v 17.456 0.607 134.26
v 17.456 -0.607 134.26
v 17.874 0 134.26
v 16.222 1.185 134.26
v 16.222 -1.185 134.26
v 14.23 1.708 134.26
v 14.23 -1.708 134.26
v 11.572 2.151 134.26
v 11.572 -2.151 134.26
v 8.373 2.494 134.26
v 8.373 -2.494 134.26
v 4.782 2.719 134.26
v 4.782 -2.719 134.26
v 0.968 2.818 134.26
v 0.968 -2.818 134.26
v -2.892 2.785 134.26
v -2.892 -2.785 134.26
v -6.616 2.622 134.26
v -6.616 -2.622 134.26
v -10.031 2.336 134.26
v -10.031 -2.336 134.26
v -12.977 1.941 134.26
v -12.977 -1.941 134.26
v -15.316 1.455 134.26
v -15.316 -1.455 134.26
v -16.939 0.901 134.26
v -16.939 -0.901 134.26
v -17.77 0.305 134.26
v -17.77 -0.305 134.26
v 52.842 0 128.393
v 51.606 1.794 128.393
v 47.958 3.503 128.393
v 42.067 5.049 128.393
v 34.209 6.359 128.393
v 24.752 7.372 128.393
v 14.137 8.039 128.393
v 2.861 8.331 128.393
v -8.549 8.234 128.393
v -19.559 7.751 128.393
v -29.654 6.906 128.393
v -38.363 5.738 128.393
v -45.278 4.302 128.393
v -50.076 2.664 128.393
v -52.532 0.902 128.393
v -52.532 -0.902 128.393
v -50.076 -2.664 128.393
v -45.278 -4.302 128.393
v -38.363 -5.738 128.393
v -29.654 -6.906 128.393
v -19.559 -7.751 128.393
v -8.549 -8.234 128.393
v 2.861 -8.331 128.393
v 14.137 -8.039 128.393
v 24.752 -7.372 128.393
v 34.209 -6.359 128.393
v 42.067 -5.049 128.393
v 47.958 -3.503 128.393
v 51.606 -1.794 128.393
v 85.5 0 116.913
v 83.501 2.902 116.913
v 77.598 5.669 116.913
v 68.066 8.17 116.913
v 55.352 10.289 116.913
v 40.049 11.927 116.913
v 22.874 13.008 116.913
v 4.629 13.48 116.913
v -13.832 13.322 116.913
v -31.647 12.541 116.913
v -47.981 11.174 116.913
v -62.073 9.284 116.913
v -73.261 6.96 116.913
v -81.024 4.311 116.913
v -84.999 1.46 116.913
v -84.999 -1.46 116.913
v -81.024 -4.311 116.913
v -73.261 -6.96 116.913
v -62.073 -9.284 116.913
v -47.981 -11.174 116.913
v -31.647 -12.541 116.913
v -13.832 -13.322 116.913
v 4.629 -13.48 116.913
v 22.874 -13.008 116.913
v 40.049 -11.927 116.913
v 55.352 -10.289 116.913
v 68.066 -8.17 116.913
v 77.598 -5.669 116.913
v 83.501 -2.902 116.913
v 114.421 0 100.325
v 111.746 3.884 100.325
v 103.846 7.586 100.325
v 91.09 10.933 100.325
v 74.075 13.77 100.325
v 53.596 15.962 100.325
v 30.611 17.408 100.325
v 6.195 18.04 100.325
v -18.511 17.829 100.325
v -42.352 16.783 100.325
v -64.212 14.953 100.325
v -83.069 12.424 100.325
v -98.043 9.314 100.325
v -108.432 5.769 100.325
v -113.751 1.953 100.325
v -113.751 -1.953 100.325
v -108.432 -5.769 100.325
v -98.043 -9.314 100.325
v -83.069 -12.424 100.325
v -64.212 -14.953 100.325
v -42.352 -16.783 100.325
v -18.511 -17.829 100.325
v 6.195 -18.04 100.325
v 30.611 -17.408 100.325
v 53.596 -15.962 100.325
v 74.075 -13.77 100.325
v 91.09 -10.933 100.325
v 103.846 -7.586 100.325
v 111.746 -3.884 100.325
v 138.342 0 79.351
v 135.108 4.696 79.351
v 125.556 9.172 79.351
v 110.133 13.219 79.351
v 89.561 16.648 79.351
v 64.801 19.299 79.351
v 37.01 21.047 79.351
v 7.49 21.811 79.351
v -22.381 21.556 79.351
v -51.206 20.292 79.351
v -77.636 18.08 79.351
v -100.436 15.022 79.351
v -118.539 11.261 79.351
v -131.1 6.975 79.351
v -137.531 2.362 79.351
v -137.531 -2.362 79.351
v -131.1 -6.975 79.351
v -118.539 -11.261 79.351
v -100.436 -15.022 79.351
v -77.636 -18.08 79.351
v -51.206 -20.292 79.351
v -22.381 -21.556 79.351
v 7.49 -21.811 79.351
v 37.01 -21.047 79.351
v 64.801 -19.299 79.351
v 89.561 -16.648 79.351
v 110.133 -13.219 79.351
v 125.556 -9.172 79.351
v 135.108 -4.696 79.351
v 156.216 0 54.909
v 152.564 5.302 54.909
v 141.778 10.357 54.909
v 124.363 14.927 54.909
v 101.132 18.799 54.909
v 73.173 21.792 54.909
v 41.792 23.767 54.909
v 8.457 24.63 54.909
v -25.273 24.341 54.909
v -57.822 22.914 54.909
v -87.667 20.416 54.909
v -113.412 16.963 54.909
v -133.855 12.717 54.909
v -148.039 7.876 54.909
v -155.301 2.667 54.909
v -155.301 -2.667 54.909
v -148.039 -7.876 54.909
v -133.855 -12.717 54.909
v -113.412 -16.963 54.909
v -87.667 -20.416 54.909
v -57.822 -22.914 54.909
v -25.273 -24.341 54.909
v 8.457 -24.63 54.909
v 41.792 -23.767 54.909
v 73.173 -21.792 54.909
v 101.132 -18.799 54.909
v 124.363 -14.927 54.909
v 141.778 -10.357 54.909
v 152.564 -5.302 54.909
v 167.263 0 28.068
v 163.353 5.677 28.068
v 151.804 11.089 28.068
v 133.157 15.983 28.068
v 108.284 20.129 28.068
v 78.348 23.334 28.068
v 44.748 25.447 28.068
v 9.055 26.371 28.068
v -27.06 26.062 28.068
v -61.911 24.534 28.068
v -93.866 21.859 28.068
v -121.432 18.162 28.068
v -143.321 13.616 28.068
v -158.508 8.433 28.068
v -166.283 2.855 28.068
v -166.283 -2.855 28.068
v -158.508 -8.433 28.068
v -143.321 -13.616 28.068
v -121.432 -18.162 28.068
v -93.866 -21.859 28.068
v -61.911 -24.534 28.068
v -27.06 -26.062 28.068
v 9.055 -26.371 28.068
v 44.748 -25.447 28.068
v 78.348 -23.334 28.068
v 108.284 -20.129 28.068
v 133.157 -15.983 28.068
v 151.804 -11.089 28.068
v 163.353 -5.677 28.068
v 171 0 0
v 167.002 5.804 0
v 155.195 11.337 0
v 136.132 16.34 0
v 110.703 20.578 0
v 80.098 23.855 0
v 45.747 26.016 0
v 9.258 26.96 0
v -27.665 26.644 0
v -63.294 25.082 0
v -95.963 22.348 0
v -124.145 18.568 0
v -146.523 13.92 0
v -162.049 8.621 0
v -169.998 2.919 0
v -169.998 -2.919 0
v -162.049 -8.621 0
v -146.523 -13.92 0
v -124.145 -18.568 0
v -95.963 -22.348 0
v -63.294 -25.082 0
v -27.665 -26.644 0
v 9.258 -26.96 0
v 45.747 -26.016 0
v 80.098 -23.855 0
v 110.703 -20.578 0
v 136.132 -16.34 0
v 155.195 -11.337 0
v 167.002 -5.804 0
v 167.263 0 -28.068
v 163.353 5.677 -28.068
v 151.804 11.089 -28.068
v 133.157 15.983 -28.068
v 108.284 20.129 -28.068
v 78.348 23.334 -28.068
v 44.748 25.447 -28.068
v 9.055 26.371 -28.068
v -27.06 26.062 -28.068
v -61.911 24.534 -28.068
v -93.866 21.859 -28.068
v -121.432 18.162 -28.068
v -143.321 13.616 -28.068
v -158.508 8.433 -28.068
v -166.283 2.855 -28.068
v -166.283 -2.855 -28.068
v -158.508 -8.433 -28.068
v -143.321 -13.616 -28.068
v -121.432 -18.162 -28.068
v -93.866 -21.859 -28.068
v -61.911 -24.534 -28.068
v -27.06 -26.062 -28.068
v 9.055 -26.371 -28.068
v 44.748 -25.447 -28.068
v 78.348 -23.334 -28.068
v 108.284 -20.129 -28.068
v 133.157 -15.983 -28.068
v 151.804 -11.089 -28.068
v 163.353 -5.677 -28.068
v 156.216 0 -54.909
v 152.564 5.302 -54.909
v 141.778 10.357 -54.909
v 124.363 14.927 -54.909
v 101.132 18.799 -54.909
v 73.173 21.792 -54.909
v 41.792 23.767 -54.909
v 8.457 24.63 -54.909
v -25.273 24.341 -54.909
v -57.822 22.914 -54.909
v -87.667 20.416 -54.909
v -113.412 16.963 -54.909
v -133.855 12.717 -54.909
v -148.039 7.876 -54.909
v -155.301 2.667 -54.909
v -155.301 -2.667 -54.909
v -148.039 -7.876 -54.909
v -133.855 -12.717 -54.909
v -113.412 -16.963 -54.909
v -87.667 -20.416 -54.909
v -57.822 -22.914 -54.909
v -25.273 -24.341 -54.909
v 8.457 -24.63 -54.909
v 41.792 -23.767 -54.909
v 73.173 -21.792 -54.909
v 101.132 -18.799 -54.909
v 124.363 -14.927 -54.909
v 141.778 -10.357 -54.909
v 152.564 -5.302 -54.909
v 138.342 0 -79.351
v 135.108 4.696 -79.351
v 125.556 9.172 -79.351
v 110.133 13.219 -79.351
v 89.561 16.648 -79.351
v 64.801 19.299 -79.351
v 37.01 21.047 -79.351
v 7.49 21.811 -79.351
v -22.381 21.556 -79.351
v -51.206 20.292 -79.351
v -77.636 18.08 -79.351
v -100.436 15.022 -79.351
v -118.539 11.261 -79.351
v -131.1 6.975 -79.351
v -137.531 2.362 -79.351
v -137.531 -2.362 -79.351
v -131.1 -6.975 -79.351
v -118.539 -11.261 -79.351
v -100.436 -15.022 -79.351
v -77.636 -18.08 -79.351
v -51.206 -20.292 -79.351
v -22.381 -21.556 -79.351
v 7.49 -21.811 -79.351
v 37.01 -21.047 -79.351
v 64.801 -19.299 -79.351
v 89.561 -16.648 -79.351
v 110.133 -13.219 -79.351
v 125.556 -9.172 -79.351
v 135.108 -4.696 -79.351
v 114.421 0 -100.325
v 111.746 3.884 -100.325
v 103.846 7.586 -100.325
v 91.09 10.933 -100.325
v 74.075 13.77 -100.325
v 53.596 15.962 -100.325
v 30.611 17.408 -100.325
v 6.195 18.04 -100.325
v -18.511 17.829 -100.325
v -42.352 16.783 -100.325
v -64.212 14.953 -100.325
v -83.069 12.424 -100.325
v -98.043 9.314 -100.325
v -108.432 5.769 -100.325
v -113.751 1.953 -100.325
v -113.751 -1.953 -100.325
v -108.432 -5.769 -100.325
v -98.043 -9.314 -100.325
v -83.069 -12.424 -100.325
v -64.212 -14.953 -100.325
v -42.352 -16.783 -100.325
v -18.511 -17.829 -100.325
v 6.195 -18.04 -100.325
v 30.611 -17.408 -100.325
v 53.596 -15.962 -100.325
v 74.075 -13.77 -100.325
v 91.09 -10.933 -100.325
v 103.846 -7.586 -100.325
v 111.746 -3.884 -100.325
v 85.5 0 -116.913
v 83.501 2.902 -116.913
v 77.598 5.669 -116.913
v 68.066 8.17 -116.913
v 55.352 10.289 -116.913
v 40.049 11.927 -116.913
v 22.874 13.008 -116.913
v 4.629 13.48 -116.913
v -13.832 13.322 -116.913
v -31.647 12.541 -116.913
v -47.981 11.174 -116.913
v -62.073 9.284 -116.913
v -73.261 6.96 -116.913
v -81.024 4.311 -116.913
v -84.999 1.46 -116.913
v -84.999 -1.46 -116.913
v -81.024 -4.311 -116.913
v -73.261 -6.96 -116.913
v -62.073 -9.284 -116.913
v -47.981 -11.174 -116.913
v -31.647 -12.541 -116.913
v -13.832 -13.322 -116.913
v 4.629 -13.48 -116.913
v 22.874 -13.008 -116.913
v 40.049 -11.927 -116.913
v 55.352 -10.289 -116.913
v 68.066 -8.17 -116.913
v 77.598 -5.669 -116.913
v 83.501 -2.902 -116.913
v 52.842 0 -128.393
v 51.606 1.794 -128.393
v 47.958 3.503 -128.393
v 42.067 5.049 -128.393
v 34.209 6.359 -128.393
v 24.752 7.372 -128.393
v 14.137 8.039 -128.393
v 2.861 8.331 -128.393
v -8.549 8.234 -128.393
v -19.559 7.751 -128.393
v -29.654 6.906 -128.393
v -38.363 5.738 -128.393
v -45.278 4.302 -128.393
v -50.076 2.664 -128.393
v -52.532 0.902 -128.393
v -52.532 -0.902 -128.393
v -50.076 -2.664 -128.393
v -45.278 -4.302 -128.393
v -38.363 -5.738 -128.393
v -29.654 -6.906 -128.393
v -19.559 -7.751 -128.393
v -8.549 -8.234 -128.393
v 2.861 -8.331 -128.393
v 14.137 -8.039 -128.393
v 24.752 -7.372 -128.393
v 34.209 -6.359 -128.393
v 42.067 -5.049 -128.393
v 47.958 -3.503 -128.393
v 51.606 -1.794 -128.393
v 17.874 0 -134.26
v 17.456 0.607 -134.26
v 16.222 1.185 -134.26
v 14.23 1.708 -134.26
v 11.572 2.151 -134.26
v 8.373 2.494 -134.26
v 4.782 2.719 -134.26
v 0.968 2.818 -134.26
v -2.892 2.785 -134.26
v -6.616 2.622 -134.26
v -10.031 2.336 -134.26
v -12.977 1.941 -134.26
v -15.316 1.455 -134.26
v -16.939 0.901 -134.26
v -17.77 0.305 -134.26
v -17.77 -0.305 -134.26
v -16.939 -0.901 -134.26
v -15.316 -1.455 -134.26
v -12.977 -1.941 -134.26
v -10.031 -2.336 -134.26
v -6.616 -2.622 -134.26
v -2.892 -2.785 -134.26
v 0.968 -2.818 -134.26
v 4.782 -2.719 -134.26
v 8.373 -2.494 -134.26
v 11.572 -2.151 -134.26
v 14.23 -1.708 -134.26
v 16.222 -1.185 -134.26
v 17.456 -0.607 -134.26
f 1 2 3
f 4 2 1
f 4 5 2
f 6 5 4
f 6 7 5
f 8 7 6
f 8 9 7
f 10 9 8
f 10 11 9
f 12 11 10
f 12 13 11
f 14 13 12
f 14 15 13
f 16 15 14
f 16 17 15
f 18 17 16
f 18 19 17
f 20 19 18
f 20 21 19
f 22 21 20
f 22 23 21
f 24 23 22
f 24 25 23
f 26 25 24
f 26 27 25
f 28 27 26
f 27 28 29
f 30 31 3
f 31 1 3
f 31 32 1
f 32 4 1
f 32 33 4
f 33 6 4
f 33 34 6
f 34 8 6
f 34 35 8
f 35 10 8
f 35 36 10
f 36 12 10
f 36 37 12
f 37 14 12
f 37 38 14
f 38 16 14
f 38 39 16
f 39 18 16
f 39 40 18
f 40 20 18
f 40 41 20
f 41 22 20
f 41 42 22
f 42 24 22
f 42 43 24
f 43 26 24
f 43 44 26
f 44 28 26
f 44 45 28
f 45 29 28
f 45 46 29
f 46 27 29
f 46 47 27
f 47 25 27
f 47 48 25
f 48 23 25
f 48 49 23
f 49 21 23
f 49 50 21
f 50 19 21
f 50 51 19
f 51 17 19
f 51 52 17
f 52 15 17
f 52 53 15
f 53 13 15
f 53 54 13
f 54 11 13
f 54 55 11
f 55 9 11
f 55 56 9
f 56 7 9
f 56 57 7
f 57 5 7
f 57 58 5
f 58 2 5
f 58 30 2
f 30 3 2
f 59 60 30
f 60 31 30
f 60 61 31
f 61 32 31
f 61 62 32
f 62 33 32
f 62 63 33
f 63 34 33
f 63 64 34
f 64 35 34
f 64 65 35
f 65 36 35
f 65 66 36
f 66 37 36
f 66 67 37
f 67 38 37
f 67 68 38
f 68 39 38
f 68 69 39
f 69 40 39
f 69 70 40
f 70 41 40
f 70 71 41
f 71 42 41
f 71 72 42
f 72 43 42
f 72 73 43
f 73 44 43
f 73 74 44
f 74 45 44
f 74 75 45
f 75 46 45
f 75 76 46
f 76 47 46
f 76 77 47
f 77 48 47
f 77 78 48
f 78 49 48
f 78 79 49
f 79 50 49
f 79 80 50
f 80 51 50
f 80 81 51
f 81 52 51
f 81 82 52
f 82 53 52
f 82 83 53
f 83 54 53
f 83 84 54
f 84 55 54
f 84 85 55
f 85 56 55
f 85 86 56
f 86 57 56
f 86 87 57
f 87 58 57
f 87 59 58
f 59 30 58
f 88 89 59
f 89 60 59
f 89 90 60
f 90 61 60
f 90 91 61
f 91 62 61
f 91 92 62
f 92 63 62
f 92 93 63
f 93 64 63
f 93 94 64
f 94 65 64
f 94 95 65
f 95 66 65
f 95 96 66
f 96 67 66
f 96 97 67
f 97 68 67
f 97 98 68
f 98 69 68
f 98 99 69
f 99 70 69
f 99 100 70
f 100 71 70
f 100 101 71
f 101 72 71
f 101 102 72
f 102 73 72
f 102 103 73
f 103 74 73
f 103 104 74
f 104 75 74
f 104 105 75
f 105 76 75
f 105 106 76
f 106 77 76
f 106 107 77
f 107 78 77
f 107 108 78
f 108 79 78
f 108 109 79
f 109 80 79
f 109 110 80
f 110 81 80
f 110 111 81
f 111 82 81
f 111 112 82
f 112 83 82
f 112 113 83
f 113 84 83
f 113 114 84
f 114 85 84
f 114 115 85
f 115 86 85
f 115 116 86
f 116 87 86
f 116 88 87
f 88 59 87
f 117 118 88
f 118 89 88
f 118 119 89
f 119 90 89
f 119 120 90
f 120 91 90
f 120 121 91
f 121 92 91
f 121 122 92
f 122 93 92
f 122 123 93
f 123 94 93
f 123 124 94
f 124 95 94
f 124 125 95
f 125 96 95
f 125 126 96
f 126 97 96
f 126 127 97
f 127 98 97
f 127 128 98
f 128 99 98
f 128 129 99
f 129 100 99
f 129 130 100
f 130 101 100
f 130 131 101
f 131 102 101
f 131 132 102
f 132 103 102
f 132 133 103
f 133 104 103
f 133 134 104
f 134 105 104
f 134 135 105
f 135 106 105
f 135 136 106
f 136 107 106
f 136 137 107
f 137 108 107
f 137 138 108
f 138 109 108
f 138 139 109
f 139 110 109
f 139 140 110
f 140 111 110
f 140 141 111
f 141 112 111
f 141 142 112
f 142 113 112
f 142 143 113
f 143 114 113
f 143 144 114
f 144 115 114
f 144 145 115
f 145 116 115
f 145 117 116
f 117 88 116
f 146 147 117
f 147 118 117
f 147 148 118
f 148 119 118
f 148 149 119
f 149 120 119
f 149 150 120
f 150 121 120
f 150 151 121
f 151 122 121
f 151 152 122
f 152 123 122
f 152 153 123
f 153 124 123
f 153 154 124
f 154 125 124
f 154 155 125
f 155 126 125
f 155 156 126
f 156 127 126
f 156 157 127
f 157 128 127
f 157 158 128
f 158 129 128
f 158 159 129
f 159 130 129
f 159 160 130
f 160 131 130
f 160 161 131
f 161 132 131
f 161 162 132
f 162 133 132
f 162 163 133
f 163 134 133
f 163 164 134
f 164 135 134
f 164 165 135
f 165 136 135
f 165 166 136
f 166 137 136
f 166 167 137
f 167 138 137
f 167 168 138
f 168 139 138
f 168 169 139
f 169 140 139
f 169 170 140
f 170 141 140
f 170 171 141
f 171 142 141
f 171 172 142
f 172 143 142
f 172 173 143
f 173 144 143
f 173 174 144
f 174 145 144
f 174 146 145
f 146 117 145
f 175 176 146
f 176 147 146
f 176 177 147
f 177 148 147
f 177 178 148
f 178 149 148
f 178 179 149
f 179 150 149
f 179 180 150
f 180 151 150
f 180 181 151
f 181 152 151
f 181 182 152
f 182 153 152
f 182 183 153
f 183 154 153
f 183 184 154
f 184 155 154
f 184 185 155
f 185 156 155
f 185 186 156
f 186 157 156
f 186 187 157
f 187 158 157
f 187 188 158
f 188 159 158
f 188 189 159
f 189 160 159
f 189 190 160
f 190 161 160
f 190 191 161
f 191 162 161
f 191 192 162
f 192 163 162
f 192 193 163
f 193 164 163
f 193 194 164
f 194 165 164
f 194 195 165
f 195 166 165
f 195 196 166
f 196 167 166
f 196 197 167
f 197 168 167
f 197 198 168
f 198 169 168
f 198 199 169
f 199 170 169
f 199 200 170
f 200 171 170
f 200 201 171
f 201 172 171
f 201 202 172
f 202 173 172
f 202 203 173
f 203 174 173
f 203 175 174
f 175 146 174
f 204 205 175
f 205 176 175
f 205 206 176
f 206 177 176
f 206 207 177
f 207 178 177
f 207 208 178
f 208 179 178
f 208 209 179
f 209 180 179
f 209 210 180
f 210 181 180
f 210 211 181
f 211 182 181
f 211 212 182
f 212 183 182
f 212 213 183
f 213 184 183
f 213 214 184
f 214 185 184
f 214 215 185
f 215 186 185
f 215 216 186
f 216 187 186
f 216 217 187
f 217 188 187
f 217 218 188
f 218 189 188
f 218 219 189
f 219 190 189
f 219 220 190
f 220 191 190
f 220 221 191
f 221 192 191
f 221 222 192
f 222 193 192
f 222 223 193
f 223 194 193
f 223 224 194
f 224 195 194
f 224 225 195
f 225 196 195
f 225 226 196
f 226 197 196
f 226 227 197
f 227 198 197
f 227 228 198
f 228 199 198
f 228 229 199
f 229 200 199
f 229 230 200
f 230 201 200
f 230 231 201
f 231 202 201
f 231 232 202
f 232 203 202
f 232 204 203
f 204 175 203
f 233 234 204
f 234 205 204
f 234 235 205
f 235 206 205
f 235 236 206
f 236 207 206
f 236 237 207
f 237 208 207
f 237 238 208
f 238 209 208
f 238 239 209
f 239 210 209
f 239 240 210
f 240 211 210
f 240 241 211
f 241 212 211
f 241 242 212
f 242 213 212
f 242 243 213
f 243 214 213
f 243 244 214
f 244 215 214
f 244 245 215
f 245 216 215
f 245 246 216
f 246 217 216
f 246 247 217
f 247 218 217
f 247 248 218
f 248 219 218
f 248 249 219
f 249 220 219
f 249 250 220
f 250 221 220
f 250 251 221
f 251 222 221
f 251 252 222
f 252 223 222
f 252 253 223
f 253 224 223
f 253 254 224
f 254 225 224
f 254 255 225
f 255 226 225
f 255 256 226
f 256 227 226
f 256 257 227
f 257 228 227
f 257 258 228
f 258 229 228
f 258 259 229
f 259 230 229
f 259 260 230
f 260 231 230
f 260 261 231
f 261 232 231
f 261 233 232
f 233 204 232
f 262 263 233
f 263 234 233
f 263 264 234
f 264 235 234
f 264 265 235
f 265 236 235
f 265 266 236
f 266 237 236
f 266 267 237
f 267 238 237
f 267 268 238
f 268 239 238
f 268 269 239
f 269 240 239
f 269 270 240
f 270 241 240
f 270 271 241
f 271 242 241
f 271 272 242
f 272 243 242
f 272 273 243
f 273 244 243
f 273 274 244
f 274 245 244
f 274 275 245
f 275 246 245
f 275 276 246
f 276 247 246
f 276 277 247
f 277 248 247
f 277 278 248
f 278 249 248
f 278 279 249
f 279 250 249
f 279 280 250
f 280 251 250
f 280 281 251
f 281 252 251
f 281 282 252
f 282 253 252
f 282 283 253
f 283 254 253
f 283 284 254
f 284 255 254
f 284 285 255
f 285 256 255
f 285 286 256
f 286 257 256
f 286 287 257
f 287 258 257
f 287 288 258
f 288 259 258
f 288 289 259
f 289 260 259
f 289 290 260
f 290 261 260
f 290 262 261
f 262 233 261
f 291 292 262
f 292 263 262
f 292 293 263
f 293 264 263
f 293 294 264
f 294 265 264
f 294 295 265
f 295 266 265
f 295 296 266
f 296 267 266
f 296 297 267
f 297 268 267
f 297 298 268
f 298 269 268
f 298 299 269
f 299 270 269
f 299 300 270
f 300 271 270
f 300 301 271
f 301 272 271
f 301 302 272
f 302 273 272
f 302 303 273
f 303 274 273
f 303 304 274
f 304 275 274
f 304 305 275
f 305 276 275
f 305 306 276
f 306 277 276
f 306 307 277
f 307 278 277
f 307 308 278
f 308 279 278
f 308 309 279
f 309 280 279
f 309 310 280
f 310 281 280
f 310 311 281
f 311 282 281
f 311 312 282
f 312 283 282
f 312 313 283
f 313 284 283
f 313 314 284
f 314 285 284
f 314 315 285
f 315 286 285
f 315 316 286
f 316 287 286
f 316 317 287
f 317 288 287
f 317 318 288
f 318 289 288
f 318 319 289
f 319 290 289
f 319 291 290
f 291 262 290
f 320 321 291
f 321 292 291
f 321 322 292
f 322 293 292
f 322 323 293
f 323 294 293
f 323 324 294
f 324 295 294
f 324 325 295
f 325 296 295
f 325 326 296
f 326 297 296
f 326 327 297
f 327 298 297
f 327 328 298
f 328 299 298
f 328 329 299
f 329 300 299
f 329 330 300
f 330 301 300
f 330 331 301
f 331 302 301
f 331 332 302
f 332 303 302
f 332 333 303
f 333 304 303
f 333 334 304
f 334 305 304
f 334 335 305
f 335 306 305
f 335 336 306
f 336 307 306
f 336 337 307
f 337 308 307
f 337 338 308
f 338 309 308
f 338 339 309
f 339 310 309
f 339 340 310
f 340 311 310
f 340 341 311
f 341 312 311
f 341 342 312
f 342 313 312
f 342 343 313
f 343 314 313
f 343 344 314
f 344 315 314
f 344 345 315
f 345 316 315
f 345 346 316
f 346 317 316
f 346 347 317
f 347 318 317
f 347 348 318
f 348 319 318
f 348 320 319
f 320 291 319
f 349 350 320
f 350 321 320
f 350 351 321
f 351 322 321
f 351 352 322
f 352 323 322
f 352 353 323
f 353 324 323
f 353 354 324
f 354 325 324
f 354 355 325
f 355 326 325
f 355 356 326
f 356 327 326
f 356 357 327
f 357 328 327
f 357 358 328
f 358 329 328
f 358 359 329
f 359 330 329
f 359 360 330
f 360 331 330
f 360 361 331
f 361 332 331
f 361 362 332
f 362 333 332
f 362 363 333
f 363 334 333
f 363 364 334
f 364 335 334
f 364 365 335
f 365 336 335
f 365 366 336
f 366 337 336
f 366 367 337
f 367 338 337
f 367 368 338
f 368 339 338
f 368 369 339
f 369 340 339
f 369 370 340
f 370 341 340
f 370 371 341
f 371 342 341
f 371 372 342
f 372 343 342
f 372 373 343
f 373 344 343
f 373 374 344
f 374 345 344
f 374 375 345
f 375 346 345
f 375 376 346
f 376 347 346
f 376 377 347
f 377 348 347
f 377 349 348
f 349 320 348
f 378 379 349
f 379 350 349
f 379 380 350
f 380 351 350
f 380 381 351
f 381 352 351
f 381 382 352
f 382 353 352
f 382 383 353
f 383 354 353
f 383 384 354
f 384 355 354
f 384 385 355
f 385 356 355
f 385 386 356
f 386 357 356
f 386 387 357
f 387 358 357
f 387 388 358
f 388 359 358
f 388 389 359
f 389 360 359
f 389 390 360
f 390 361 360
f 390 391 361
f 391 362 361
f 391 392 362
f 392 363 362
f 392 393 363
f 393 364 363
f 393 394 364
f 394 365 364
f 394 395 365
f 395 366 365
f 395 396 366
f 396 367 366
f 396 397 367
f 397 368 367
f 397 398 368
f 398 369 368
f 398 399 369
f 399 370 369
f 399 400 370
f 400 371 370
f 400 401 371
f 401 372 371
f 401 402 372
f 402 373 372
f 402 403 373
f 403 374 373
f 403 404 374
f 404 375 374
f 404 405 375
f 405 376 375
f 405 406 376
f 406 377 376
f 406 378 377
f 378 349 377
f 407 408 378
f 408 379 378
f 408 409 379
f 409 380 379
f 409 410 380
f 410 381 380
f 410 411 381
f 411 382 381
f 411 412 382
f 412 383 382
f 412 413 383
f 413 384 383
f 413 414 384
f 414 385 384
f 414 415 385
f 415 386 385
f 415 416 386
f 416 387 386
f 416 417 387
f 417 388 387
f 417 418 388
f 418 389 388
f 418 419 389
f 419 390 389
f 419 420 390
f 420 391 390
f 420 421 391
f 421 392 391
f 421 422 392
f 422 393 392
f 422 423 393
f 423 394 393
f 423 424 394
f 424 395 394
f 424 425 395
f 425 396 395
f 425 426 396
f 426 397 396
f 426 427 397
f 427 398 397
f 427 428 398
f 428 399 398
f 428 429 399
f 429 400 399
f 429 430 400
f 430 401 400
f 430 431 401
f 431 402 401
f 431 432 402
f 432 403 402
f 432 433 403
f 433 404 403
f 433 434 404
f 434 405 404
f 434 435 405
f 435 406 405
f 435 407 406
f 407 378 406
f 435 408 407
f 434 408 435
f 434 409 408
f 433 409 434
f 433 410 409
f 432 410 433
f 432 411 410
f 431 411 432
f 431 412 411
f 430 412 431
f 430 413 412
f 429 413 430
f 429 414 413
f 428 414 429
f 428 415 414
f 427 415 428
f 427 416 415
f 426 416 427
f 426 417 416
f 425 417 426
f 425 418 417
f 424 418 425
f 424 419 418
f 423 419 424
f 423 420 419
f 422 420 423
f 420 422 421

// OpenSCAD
// Generated by SolidPython 1.0.1 on 2020-07-29 00:46:53


scale(v = [19, 3, 15]) {
	sphere(r = 9);
}
/***********************************************
*********      SolidPython code:      **********
************************************************
 
# import packages: SolidPython
from solid import *
from solid.utils import *
from itertools import chain, combinations, permutations


class Resize:

    def __init__(self, scad_file):
        self.scad_file = scad_file
        #self.scad_file = import_scad(scad_file)
        # cone/cylinder param:
        self.r1 = 0
        self.r2 = 0
        self.h = 0
        # rectangular prism param:
        self.w = 0
        self.l = 0
        # ellipse param:
        self.r = 0

    # import OpenScad code (file name corresponds to shape)


    # classify shape + parameters
    def assign(self, param1, param2, param3):
        if self.scad_file == 'cone.scad':
            self.r1 = param1
            self.r2 = param2
            self.h = param3
        elif self.scad_file == 'cylinder.scad':
            self.r1 = param1
            self.r2 = param2
            self.h = param3
        elif self.scad_file == 'rectangularPrism.scad':
            self.h = param1
            self.l = param2
            self.w = param3
        else:
            self.r = param1
            self.h = param2

    # resize parameters
    def iterate(self):
        x = range(3, 20, 2)
        i = 1
        if self.scad_file == 'cone.scad':
            tempList = list(permutations(x, 2))
            for temp in tempList:
                param1 = temp[0]
                param2 = temp[1]
                filepath = 'produced_scad_files/' + 'cone' + str(param1) + '_' + str(param2) + '_' + '.scad'
                scad_render_to_file(cylinder(h=param1, r1=param2, r2=0), filepath)

        elif self.scad_file == 'cylinder.scad':
            tempList = list(permutations(x, 3))
            for temp in tempList:
                param1 = temp[0]
                param2 = temp[1]
                filepath = 'produced_scad_files/' + 'cylinder' + str(param1) + '_' + str(param2) + '_' + '.scad'
                scad_render_to_file(cylinder(h=param1, r1=param2, r2=param2), filepath)

        elif self.scad_file == 'rectangularPrism.scad':
            tempList = list(permutations(x, 3))
            for temp in tempList:
                param1 = temp[0]
                param2 = temp[1]
                param3 = temp[2]
                filepath = 'produced_scad_files/' + 'rectangularPrism' + str(param1) + '_' + str(param2) + '_' + str(
                    param3) + '.scad'
                scad_render_to_file(cube(size=(param1, param2, param3)), filepath)

        elif self.scad_file == 'ellipse.scad':
            tempList = list(permutations(x, 4))
            for temp in tempList:
                param1 = temp[0]
                param2 = temp[1]
                param3 = temp[2]
                param4 = temp[3]
                filepath = 'produced_scad_files/' + 'ellipse' + str(param1) + '_' + str(param2) + '_' + str(param3) + '_' + str(param4) + '.scad'
                scad_render_to_file(scale([param1, param2, param3])(sphere(r=param4)), filepath)

    def render_to_scadfile(self):
        scad_render_to_file(scad, 'example.scad') 
 
************************************************/
